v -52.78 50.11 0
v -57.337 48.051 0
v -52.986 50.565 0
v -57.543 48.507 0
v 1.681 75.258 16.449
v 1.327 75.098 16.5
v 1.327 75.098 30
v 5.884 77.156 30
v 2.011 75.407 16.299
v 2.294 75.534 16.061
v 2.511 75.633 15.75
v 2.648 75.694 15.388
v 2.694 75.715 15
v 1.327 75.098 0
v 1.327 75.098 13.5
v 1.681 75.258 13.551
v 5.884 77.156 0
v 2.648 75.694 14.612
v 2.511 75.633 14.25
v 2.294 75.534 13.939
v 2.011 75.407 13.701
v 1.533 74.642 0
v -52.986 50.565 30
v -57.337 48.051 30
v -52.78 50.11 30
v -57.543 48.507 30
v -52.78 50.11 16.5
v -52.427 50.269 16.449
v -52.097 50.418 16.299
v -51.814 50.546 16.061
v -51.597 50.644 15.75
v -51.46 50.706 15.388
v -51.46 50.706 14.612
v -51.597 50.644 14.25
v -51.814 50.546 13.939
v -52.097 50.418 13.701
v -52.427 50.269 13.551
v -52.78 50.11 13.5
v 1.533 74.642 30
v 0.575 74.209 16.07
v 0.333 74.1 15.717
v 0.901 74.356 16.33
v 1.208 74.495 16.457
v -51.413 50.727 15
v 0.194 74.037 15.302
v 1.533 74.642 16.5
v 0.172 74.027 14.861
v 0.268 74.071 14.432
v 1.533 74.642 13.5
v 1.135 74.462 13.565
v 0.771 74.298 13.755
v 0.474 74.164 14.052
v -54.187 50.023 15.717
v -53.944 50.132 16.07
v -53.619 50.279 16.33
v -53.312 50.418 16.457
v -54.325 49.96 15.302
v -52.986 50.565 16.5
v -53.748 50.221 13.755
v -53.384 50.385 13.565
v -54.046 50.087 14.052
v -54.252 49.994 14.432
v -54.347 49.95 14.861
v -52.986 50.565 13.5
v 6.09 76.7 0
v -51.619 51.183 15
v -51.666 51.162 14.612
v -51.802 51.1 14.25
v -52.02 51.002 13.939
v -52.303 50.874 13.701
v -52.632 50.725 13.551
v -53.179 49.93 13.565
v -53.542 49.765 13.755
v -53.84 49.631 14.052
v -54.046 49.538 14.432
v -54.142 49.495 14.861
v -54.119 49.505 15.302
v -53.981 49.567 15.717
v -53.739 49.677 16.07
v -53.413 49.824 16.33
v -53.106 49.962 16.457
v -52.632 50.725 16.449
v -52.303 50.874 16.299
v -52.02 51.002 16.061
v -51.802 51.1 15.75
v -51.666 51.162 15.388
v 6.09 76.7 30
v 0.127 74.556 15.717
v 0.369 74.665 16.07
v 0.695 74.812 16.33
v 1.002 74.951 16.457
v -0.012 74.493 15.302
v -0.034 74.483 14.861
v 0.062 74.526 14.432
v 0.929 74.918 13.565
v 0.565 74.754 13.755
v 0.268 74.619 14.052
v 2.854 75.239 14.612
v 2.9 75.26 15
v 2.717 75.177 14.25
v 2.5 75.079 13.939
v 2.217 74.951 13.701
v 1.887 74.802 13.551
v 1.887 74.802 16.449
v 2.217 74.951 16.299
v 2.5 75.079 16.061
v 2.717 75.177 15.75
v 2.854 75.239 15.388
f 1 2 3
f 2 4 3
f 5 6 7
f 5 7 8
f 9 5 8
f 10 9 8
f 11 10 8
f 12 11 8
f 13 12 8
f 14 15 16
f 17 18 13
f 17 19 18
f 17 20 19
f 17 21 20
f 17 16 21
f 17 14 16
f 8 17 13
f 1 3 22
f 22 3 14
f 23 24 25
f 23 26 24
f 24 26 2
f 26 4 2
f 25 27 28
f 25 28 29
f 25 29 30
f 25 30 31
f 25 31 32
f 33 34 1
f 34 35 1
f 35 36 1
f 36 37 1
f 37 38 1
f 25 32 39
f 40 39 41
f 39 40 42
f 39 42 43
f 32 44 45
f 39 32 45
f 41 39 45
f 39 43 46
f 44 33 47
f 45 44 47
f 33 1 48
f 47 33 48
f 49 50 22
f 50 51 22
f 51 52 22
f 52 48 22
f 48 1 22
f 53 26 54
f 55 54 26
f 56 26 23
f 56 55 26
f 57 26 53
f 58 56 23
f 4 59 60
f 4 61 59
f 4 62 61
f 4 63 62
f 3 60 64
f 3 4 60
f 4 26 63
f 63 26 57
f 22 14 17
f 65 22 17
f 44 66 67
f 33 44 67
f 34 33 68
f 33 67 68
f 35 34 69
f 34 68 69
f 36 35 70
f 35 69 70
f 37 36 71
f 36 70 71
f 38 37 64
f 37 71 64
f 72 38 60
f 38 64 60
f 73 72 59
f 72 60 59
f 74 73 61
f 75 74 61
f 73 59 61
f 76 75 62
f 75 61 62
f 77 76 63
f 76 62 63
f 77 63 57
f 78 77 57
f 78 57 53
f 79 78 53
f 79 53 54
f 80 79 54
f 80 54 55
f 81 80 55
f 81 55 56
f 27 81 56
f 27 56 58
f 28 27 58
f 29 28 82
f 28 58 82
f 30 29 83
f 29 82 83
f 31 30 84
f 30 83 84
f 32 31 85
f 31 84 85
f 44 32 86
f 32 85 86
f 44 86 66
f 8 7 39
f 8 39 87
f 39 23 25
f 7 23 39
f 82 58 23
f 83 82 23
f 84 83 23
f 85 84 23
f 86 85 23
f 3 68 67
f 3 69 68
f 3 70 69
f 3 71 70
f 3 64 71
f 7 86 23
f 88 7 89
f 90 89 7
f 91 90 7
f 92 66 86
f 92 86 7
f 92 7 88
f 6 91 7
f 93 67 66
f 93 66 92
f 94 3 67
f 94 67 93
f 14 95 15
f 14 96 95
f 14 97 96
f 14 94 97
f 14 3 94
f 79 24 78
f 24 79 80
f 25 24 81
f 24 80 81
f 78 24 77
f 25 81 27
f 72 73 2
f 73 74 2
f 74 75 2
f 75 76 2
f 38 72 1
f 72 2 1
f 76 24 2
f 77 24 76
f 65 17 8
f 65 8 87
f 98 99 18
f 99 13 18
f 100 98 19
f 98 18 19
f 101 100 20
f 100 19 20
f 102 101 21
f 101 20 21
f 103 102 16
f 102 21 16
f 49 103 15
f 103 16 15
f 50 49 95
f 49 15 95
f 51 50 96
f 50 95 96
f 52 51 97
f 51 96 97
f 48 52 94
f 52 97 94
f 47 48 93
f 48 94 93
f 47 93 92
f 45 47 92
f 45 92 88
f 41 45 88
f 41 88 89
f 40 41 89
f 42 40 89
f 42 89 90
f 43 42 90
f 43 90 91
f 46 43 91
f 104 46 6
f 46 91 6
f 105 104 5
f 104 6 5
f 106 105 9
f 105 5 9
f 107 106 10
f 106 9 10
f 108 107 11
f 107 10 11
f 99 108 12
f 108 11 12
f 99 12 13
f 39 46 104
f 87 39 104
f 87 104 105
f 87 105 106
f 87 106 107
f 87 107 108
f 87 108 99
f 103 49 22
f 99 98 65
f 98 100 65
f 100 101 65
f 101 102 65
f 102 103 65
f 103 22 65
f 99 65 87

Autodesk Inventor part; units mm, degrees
ref_plane "YZ Plane" through (0, 0, 0) normal (1, 0, 0) x (0, 1, 0)
ref_plane "XZ Plane" through (0, 0, 0) normal (0, 1, 0) x (-1, 0, 0)
ref_plane "XY Plane" through (0, 0, 0) normal (0, 0, 1) x (1, 0, 0)
sketch "スケッチ1" plane through (0, 0, 0) normal (0, 0, 1) x (1, 0, 0)
  circle A0 centre (-56.2051, 45.5451) radius 2.75
  arc A1 (8.9566, 76.3281) -> (6.09, 76.7004) centre (7.222, 74.1942) ccw
  circle A2 centre (57.2805, 33.1812) radius 3
  line L0 (-57.3371, 48.0513) -> (6.09, 76.7004)
  line L1 (8.9566, 76.3281) -> (59.1728, 35.5091)
  line L2 (-57.543, 48.5069) -> (5.8841, 77.1561)
  arc A3 (6.09, 76.7004) -> (8.9566, 76.3281) centre (7.222, 74.1942) ccw
  arc A4 (9.4296, 76.9101) -> (5.7812, 77.3839) centre (7.222, 74.1942) ccw
  line L3 (9.4296, 76.9101) -> (59.6459, 36.0911)
  line L4 (-57.543, 48.5069) -> (-56.2051, 45.5451)
  line L5 (57.2805, 33.1812) -> (59.6459, 36.0911)
  line L6 (-52.9862, 50.5651) -> (-52.7804, 50.1095)
  line L7 (55.2929, 38.663) -> (55.766, 39.2449)
  line L8 (5.7812, 77.3839) -> (7.222, 74.1942)
  line L9 (1.3274, 75.0979) -> (1.5332, 74.6422)
  point P0 (0, 0)
  point P1 (5.7812, 77.3839)
  point P2 (6.09, 76.7004)
  point P3 (5.8841, 77.1561)
  dimension "d0" = 0.5
  dimension "d1" = 0.75
  dimension "d2" = 0.75
  dimension "d3" = 5
  dimension "d4" = 5
  dimension "d17" = 5
extrude "押し出し1" add sketch "スケッチ1" along normal blind 30 contours L4 L2 L6 L0 | L6 L2 L9 L0 | L9 L2 L8 L0
sketch "スケッチ2" plane through (-57.543, 48.5069, 30) normal (-0.4116, 0.9113, 0) x (0.9113, 0.4116, 0)
  line L0 (69.5972, 30) -> (0, 30) projected
  line L1 (0, 30) -> (0, 0) projected
  line L2 (69.5972, 0) -> (0, 0) projected
  circle A0 centre (5, 15) radius 1.5
  line L3 (69.5972, 30) -> (69.5972, 0) projected
  circle A1 centre (64.5972, 15) radius 1.5
  point P0 (32.474, 30)
  dimension "d7" = 3
  dimension "d8" = 15
  dimension "d9" = 5
  dimension "d18" = 3
  dimension "d19" = 15
  dimension "d20" = 5
extrude "押し出し2" cut sketch "スケッチ2" against normal blind 0.75 contours A0 | A1
properties part number "クランクガード前" material "ポリカーボネート、クリア"
